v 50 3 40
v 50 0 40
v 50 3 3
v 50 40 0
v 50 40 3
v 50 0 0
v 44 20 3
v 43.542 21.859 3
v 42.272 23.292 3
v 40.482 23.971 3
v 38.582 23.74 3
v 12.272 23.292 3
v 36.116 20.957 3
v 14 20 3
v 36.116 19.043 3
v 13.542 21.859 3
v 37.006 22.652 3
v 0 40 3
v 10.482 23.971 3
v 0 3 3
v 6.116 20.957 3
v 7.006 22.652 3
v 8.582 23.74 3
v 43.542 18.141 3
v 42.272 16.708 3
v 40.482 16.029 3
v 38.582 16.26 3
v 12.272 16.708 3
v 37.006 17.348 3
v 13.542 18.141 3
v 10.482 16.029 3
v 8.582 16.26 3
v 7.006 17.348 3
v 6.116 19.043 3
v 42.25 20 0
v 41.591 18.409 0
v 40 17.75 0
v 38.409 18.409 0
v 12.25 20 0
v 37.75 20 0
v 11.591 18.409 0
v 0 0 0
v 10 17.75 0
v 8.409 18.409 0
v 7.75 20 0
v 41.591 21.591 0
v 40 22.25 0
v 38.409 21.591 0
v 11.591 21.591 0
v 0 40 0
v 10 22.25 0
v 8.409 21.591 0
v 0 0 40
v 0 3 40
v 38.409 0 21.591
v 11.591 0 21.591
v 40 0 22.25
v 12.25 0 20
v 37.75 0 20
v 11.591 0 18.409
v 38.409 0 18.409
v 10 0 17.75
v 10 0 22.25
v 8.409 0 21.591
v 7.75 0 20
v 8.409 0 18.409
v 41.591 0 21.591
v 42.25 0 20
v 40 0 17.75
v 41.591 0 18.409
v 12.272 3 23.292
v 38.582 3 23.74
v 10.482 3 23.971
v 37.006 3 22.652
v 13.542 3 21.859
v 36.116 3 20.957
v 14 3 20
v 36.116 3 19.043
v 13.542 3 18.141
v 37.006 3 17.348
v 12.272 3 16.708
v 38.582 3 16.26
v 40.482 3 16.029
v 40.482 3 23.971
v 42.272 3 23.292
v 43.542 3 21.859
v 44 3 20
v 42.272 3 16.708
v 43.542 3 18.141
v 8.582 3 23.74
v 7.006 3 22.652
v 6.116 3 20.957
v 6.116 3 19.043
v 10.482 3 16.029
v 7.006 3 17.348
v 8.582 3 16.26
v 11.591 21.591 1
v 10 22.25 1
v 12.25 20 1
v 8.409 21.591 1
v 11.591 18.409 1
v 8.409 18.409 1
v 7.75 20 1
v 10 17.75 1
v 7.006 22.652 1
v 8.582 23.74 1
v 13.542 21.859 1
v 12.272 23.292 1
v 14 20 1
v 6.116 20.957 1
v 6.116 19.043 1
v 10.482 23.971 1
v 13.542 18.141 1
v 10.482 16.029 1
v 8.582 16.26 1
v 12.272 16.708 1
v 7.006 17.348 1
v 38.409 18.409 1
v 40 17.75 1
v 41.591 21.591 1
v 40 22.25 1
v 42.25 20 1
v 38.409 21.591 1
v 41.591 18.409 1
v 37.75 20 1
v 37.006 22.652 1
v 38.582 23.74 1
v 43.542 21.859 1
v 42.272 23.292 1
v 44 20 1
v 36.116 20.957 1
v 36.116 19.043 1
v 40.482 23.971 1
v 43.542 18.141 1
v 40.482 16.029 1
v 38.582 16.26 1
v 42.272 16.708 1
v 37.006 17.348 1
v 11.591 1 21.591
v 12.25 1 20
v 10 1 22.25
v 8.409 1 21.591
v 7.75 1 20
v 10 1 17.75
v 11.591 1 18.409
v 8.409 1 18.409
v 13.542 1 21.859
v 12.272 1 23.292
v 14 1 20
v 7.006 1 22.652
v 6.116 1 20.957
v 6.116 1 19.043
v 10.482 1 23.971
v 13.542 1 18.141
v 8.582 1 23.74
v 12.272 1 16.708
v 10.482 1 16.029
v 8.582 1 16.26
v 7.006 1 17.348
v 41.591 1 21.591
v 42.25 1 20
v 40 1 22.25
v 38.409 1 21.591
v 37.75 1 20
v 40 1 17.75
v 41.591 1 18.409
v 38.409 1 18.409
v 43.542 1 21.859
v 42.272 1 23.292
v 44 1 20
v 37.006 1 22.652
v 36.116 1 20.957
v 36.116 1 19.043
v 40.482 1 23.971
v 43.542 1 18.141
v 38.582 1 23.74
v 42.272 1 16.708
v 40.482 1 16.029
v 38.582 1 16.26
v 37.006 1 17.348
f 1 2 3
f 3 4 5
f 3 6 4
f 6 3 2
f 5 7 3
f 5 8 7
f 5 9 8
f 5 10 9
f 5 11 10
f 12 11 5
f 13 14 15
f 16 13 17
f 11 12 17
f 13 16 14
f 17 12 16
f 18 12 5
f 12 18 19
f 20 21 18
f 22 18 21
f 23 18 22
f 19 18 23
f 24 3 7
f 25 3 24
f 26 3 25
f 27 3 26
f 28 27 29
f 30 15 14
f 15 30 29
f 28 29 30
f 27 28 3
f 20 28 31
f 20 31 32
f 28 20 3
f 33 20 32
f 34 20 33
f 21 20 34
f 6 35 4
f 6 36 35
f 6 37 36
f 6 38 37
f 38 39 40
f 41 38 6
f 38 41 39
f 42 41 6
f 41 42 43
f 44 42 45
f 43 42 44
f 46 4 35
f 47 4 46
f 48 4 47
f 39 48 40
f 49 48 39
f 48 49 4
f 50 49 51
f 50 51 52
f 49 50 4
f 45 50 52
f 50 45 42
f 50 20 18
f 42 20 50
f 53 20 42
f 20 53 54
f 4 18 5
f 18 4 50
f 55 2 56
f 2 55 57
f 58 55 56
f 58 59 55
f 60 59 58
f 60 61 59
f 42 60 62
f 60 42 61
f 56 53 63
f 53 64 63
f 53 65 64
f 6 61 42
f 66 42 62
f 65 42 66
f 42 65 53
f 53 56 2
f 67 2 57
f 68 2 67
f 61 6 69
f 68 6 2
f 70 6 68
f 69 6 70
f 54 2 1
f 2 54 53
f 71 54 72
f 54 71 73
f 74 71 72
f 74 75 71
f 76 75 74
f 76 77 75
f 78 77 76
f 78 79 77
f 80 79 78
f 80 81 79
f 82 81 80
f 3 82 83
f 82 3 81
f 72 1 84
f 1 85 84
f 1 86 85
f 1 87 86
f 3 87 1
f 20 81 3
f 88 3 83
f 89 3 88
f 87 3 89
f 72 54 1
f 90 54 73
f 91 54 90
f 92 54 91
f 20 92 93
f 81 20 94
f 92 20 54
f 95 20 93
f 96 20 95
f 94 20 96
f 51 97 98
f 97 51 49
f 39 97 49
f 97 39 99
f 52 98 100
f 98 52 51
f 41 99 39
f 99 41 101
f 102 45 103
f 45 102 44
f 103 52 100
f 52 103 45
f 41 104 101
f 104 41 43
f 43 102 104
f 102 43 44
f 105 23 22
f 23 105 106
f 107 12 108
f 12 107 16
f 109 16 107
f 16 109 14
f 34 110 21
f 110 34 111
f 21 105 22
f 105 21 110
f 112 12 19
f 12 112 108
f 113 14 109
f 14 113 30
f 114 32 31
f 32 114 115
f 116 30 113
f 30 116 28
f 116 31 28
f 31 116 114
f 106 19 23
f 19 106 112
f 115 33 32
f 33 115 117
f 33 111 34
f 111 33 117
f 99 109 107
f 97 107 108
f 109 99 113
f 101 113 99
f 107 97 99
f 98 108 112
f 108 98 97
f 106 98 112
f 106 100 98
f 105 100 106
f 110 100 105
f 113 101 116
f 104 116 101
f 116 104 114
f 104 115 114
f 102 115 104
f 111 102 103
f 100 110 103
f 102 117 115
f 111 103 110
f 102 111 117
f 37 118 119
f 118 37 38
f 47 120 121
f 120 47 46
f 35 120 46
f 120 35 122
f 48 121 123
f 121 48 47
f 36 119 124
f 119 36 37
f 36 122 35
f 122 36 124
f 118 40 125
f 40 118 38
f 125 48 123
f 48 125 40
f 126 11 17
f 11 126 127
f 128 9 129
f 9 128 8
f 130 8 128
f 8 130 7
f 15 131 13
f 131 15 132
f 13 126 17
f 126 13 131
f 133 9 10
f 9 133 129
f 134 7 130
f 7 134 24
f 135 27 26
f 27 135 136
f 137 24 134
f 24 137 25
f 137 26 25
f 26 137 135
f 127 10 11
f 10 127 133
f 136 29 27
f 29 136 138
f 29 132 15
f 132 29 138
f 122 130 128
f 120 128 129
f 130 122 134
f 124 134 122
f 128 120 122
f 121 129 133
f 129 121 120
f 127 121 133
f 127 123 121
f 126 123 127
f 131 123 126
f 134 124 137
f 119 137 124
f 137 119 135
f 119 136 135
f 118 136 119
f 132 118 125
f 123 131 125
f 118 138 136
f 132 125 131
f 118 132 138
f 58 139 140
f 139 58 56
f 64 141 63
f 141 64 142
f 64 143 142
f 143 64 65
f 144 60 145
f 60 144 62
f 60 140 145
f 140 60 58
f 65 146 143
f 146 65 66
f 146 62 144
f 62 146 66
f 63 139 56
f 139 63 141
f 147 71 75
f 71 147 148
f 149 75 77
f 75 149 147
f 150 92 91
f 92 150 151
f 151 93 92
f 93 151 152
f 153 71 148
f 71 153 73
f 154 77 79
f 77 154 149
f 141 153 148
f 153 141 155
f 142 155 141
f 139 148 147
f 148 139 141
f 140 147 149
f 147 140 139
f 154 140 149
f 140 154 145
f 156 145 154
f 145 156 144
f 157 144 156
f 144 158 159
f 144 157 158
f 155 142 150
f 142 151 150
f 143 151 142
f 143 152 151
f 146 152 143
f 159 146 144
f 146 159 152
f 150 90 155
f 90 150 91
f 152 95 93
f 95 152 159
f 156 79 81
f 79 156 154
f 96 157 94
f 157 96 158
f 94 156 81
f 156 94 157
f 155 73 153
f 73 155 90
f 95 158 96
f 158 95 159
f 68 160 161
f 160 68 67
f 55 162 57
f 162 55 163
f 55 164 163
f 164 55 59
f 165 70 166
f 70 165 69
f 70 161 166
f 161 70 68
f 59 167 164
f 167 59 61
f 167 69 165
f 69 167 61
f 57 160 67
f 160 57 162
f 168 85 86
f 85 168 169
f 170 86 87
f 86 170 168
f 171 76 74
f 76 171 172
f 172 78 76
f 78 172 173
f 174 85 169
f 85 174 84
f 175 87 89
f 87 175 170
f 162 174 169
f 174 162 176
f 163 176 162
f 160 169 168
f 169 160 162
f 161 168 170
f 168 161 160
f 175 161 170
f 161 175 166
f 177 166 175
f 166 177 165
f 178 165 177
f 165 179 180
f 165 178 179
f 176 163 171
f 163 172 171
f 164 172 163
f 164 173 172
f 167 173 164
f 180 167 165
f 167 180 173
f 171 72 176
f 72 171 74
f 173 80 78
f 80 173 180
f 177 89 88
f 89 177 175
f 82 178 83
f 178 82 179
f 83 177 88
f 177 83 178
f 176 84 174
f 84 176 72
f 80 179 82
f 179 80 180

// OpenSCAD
// L字金具 (L-bracket)
w        = 50;   // 幅
d        = 40;   // 奥行き
h        = 40;   // 高さ
t        = 3;    // 板厚
hole_d   = 4.5;  // 貫通穴径
cs_d     = 8;    // 皿座面径
cs_depth = 2;    // 皿座面深さ
offset   = 10;   // 縁からの距離

module bracket() {
    difference() {
        // 板本体
        union() {
            // 水平フランジ (原点から +Y, +Z 方向に伸びる)
            cube([w, d, t]);
            // 垂直フランジ (原点から +Y, +Z 方向に伸びる)
            cube([w, t, h]);
        }
        // 水平フランジの穴
        for (x_pos = [offset, w - offset]) {
            // 貫通穴
            translate([x_pos, d/2, t/2])
                cylinder(d = hole_d, h = t + 2, center = true);
            // 皿穴 (外側 = +Z 側)
            translate([x_pos, d/2, t - cs_depth/2])
                cylinder(d = cs_d, h = cs_depth, center = true);
        }
        // 垂直フランジの穴
        for (x_pos = [offset, w - offset]) {
            // 貫通穴
            translate([x_pos, t/2, h/2])
                rotate([90, 0, 0])
                    cylinder(d = hole_d, h = t + 2, center = true);
            // 皿穴 (外側 = +Y 側)
            translate([x_pos, t - cs_depth/2, h/2])
                rotate([90, 0, 0])
                    cylinder(d = cs_d, h = cs_depth, center = true);
        }
    }
}

// モデル出力
bracket();
